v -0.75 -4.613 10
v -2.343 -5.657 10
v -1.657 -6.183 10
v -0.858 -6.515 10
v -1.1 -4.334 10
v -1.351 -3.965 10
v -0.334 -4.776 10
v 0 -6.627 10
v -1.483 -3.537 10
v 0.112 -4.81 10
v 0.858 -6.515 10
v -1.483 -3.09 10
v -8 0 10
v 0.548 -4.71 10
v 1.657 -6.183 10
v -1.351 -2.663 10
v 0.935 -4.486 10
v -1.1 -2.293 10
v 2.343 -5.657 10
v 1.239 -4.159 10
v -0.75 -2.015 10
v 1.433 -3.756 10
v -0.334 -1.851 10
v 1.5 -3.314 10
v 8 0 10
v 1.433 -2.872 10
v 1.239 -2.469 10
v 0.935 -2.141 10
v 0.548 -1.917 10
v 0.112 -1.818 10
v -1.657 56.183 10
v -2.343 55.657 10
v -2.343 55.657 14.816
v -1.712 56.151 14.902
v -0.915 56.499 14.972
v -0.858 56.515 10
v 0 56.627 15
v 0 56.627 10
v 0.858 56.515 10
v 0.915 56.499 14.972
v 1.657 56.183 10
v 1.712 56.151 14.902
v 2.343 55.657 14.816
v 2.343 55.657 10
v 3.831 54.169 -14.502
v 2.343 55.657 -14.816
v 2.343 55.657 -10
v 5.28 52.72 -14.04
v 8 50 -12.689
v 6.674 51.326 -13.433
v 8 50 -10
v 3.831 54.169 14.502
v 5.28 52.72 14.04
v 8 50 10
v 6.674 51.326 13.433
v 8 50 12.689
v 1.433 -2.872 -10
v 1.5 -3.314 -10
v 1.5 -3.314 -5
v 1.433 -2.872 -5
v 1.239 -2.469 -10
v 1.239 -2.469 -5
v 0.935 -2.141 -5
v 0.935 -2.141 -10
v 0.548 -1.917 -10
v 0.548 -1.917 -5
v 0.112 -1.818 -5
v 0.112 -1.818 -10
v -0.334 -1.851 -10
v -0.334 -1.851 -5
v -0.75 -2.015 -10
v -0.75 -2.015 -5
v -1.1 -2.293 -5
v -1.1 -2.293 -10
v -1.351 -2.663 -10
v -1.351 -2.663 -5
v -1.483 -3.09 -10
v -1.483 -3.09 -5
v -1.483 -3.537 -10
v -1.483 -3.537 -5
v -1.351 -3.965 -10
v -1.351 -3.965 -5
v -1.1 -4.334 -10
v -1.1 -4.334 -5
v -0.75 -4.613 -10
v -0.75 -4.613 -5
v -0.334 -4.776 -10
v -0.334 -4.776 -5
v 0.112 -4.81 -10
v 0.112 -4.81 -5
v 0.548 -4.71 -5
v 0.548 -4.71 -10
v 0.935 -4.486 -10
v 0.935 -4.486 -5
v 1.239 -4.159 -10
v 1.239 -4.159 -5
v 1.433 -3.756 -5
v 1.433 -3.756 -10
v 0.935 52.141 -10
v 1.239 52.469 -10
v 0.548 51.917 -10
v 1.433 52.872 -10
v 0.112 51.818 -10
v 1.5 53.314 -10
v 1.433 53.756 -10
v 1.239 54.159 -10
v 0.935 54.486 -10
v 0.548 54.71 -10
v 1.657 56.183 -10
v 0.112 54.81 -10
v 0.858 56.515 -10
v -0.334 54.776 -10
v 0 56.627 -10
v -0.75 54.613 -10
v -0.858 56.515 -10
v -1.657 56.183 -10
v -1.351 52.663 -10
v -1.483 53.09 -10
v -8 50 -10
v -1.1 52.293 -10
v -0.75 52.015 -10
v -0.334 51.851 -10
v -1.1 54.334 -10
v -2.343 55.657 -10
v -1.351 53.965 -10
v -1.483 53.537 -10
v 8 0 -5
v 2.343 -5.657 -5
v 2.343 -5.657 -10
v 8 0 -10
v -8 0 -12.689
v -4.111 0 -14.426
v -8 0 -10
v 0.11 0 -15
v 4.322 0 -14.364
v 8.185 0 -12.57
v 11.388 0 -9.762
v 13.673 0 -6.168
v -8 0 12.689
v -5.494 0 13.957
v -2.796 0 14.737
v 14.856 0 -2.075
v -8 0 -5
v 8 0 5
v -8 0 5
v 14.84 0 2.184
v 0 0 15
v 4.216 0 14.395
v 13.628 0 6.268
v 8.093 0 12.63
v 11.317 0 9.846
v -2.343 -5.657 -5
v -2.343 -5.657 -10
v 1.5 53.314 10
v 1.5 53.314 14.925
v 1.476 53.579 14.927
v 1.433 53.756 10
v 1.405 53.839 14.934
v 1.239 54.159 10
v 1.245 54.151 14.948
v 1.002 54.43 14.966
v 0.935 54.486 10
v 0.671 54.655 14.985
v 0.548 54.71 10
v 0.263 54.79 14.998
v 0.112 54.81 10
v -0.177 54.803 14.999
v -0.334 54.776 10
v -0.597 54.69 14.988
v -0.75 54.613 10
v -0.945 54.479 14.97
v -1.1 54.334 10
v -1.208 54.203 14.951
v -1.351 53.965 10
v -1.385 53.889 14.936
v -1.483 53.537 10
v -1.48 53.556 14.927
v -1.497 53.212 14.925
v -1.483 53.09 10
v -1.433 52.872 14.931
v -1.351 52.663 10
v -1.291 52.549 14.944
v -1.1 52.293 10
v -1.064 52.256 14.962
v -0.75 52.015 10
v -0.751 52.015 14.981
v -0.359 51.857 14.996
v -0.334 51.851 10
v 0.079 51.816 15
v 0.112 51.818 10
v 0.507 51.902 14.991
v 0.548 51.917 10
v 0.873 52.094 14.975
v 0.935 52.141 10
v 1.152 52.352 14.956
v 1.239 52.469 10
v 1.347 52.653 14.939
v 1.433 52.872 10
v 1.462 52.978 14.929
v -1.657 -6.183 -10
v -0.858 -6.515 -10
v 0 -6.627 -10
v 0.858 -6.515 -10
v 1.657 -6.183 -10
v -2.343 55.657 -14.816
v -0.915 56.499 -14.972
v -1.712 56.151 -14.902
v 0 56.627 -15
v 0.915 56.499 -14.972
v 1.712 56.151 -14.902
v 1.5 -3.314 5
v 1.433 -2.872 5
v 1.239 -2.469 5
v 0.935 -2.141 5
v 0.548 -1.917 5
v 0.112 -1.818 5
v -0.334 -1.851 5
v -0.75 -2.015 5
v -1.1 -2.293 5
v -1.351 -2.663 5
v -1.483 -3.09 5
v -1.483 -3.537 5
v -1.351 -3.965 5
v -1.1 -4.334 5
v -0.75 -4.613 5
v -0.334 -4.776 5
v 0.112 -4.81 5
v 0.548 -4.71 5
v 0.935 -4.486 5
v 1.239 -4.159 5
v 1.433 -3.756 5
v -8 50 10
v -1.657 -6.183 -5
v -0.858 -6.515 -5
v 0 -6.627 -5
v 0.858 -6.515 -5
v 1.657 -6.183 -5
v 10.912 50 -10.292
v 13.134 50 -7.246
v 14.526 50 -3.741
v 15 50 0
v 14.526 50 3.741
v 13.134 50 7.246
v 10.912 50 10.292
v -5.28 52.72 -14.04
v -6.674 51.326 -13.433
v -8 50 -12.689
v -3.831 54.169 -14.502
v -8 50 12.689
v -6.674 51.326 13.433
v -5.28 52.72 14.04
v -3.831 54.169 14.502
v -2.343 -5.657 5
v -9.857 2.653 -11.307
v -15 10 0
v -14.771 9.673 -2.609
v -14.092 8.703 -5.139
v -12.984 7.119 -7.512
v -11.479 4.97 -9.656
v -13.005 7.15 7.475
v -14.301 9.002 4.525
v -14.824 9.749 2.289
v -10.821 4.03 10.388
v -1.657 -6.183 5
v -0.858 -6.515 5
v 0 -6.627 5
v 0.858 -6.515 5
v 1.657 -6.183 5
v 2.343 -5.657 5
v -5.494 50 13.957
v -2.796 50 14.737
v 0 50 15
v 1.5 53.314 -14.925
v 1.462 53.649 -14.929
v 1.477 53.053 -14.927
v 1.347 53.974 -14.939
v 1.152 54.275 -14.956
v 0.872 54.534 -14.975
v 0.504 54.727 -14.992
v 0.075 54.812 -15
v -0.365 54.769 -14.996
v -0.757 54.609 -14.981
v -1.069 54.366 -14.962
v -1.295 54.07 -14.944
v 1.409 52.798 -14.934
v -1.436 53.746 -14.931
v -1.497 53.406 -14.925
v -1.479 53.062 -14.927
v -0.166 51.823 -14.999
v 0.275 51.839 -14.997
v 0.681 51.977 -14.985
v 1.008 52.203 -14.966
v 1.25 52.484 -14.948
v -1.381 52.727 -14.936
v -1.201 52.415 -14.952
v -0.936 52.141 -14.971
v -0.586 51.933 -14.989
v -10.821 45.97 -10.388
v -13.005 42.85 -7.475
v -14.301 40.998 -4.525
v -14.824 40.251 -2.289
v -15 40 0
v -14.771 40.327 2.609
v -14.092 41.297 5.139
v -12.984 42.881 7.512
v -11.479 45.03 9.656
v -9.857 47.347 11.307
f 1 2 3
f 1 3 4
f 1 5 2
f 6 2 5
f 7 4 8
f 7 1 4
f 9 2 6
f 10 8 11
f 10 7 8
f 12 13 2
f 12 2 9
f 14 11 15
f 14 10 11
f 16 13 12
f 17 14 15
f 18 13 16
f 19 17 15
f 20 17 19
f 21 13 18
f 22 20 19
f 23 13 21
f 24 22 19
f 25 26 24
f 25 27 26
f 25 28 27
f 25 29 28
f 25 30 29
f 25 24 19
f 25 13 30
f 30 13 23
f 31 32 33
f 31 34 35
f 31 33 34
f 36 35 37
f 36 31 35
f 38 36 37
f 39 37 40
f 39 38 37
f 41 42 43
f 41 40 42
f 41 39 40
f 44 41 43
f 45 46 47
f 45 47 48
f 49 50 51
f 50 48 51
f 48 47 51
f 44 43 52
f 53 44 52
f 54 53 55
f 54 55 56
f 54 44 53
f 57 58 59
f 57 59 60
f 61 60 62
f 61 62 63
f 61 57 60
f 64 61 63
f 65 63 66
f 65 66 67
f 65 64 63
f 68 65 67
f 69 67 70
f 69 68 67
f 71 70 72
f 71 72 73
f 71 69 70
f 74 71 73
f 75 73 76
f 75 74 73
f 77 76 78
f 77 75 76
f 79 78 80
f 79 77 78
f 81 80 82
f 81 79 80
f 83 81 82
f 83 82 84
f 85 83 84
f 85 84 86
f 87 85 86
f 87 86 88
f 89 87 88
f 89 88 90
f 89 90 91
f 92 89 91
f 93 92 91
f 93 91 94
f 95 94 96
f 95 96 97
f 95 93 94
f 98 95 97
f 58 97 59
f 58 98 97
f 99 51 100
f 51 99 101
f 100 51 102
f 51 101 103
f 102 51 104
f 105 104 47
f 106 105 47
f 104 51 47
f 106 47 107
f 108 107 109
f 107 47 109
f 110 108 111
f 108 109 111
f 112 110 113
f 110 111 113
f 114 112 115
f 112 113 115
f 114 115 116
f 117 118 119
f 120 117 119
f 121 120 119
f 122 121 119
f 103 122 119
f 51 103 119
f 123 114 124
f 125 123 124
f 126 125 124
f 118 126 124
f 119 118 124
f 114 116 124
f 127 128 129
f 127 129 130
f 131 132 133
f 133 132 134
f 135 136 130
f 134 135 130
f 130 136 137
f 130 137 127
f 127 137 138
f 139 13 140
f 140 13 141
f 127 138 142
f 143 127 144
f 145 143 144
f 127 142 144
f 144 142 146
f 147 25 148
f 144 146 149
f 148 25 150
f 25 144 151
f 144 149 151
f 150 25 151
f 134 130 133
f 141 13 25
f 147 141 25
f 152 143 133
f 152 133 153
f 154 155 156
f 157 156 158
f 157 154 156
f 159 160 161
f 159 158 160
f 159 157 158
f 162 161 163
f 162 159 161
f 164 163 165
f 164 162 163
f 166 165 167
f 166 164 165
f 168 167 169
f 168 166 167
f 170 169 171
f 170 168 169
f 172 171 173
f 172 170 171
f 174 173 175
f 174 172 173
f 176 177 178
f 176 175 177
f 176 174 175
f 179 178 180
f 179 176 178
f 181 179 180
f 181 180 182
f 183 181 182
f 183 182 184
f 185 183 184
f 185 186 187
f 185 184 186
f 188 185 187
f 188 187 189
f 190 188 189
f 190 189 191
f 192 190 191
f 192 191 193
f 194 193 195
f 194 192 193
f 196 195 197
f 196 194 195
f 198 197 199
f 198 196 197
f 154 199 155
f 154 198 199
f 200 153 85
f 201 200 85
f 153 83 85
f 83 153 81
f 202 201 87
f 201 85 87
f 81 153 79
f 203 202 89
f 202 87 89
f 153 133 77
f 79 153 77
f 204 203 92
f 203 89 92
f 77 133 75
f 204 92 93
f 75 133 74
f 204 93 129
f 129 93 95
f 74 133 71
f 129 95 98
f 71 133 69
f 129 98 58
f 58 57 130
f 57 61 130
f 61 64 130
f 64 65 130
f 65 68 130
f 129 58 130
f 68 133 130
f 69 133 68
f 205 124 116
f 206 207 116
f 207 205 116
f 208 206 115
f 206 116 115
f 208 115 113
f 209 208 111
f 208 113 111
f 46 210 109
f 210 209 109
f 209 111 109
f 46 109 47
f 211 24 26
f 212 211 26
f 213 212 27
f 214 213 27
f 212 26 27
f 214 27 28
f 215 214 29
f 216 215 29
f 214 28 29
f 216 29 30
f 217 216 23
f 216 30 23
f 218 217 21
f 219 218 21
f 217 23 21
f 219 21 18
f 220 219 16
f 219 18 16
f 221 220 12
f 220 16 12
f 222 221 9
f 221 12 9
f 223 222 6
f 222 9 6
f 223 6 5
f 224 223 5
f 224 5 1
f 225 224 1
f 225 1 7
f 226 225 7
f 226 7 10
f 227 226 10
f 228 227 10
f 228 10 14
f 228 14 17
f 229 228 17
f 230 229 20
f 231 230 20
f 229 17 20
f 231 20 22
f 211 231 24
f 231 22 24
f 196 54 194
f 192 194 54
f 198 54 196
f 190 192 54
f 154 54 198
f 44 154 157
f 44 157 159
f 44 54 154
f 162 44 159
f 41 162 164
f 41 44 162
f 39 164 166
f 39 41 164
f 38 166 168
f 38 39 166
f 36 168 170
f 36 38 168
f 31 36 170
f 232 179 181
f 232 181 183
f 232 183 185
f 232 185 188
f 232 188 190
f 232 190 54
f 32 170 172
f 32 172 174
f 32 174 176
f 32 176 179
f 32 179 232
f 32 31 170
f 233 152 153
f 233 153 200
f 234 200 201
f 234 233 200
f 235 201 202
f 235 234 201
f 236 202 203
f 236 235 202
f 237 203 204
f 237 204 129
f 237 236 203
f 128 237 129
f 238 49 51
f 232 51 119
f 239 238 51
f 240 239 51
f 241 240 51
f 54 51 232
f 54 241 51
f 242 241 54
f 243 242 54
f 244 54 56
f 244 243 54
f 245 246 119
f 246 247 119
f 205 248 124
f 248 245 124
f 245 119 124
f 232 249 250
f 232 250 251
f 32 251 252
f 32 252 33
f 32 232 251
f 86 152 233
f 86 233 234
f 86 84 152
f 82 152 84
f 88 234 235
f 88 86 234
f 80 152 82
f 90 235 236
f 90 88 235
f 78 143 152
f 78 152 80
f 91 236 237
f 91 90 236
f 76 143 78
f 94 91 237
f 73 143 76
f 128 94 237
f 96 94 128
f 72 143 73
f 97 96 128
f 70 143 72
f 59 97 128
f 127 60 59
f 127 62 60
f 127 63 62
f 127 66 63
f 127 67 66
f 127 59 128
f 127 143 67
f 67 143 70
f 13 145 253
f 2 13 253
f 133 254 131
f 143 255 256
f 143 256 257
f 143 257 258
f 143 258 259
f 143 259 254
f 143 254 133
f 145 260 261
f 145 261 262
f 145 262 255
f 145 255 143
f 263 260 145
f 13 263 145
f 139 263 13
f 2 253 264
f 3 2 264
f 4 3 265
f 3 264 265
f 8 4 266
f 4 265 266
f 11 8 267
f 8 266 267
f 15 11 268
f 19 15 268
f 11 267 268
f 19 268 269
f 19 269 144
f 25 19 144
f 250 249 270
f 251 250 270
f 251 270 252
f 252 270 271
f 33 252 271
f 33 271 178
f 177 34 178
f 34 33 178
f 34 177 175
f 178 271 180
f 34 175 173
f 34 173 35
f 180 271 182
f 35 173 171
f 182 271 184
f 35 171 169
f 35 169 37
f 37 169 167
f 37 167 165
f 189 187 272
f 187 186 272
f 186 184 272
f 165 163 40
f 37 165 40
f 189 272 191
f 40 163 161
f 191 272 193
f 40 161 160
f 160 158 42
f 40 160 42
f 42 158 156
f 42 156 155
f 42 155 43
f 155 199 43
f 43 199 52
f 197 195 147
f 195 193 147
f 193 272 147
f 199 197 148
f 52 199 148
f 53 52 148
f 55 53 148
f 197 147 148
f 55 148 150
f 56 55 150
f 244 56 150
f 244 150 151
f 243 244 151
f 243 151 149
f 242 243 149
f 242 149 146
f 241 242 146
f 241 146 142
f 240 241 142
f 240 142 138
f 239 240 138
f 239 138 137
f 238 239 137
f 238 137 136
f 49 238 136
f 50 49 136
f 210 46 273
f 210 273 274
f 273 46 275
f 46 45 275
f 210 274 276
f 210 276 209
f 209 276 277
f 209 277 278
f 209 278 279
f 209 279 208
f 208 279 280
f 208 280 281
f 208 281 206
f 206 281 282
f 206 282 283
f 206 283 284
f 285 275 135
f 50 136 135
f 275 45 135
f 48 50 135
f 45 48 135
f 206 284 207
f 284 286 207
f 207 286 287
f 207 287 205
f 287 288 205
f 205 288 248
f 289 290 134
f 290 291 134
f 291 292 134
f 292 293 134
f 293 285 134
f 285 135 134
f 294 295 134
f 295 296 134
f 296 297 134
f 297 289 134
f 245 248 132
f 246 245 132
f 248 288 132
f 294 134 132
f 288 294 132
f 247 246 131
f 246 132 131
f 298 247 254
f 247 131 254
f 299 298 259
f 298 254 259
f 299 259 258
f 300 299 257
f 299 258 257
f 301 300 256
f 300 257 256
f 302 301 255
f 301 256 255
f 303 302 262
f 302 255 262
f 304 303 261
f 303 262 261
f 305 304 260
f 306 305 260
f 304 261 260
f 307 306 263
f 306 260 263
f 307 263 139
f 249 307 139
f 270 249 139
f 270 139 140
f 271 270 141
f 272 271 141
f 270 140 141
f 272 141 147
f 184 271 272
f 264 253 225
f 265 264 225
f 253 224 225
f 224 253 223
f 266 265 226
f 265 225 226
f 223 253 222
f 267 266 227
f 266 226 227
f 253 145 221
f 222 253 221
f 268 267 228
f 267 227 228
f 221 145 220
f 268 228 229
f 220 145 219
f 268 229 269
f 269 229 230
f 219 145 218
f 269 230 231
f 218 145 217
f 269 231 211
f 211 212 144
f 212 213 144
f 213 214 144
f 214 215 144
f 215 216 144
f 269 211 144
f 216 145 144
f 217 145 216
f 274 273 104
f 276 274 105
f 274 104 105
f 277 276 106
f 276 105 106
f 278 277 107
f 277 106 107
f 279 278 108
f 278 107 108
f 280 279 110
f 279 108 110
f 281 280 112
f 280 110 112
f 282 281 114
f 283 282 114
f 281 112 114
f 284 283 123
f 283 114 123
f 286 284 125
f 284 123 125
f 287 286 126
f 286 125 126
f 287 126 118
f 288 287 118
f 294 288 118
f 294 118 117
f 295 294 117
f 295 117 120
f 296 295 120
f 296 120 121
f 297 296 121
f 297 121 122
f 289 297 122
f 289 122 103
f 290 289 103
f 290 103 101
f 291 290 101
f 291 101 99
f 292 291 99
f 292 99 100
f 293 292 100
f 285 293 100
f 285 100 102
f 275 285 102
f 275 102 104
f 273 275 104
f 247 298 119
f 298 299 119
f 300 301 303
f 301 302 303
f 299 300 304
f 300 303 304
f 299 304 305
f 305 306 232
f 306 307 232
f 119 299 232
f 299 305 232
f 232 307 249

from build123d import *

# Parameters (mm, degrees)
CROQUIS1_R              = 15
SALIENTE_EXTRUIR1_DEPTH = 50
SALIENTE_EXTRUIR2_START = 5
SALIENTE_EXTRUIR2_DEPTH = 5
CROQUIS3_R              = 1.5
CORTAR_EXTRUIR1_DEPTH   = 5
CORTAR_EXTRUIR2_DEPTH   = 25
SALIENTE_EXTRUIR3_START = 10
CROQUIS5_R              = 1.5
SALIENTE_EXTRUIR3_DEPTH = 5
CROQUIS6_R              = 22.280416197
CROQUIS6_R_2            = 15
CORTAR_EXTRUIR3_DEPTH   = 20


with BuildPart() as part:
    # Croquis1 → Saliente-Extruir1 (new body)
    with BuildSketch(Plane(origin=(0, 0, 0), x_dir=(1, 0, 0), z_dir=(0, 1, 0))):
        with Locations(Location((0, 0, 0), (0, 0, 270))):
            Circle(CROQUIS1_R)
    extrude(amount=SALIENTE_EXTRUIR1_DEPTH)

    # Croquis2 → Saliente-Extruir2 (add)
    with BuildSketch(Plane.XY.offset(SALIENTE_EXTRUIR2_START)):
        with BuildLine():
            Line((-8, 0), (-2.343145751, -5.656854249))
            ThreePointArc((-2.343145751, -5.656854249), (0, -6.627416998), (2.343145751, -5.656854249))
            Line((2.343145751, -5.656854249), (8, 0))
            Line((8, 0), (-8, 0))
        make_face()
    saliente_extruir2 = extrude(amount=SALIENTE_EXTRUIR2_DEPTH)

    # Croquis3 → Cortar-Extruir1 (cut)
    with BuildSketch(Plane.XY.offset(10)):
        with Locations((0, -3.313708499)):
            Circle(CROQUIS3_R)
    cortar_extruir1 = extrude(amount=-CORTAR_EXTRUIR1_DEPTH, mode=Mode.SUBTRACT)

    # Simetría1: Saliente-Extruir2, Cortar-Extruir1 across plane
    add(saliente_extruir2.mirror(Plane.XY))
    add(cortar_extruir1.mirror(Plane.XY), mode=Mode.SUBTRACT)

    # Croquis4 → Cortar-Extruir2 (cut, symmetric)
    with BuildSketch(Plane.XY):
        Polygon((-8, 0), (-15, 0), (-15, 10), align=None)
    cortar_extruir2 = extrude(amount=CORTAR_EXTRUIR2_DEPTH, both=True, mode=Mode.SUBTRACT)

    # Simetría2: Cortar-Extruir2 across plane
    add(cortar_extruir2.mirror(Plane.ZX.offset(25)), mode=Mode.SUBTRACT)

    # Croquis5 → Saliente-Extruir3 (add)
    with BuildSketch(Plane.XY.offset(SALIENTE_EXTRUIR3_START)):
        with BuildLine():
            Line((-8, 50), (-2.343145751, 55.656854249))
            ThreePointArc((-2.343145751, 55.656854249), (0, 56.627416998), (2.343145751, 55.656854249))
            Line((2.343145751, 55.656854249), (8, 50))
            Line((8, 50), (-8, 50))
        make_face()
        with Locations((0, 53.313708499)):
            Circle(CROQUIS5_R, mode=Mode.SUBTRACT)
    saliente_extruir3 = extrude(amount=SALIENTE_EXTRUIR3_DEPTH)

    # Simetría3: Saliente-Extruir3 across plane
    add(saliente_extruir3.mirror(Plane.XY))

    # Croquis6 → Cortar-Extruir3 (cut)
    with BuildSketch(Plane(origin=(0, 50, 0), x_dir=(1, 0, 0), z_dir=(0, 1, 0))):
        Circle(CROQUIS6_R)
        with Locations(Location((0, 0, 0), (0, 0, 122.230952636))):
            Circle(CROQUIS6_R_2, mode=Mode.SUBTRACT)
    extrude(amount=CORTAR_EXTRUIR3_DEPTH, mode=Mode.SUBTRACT)


solid = part.part
